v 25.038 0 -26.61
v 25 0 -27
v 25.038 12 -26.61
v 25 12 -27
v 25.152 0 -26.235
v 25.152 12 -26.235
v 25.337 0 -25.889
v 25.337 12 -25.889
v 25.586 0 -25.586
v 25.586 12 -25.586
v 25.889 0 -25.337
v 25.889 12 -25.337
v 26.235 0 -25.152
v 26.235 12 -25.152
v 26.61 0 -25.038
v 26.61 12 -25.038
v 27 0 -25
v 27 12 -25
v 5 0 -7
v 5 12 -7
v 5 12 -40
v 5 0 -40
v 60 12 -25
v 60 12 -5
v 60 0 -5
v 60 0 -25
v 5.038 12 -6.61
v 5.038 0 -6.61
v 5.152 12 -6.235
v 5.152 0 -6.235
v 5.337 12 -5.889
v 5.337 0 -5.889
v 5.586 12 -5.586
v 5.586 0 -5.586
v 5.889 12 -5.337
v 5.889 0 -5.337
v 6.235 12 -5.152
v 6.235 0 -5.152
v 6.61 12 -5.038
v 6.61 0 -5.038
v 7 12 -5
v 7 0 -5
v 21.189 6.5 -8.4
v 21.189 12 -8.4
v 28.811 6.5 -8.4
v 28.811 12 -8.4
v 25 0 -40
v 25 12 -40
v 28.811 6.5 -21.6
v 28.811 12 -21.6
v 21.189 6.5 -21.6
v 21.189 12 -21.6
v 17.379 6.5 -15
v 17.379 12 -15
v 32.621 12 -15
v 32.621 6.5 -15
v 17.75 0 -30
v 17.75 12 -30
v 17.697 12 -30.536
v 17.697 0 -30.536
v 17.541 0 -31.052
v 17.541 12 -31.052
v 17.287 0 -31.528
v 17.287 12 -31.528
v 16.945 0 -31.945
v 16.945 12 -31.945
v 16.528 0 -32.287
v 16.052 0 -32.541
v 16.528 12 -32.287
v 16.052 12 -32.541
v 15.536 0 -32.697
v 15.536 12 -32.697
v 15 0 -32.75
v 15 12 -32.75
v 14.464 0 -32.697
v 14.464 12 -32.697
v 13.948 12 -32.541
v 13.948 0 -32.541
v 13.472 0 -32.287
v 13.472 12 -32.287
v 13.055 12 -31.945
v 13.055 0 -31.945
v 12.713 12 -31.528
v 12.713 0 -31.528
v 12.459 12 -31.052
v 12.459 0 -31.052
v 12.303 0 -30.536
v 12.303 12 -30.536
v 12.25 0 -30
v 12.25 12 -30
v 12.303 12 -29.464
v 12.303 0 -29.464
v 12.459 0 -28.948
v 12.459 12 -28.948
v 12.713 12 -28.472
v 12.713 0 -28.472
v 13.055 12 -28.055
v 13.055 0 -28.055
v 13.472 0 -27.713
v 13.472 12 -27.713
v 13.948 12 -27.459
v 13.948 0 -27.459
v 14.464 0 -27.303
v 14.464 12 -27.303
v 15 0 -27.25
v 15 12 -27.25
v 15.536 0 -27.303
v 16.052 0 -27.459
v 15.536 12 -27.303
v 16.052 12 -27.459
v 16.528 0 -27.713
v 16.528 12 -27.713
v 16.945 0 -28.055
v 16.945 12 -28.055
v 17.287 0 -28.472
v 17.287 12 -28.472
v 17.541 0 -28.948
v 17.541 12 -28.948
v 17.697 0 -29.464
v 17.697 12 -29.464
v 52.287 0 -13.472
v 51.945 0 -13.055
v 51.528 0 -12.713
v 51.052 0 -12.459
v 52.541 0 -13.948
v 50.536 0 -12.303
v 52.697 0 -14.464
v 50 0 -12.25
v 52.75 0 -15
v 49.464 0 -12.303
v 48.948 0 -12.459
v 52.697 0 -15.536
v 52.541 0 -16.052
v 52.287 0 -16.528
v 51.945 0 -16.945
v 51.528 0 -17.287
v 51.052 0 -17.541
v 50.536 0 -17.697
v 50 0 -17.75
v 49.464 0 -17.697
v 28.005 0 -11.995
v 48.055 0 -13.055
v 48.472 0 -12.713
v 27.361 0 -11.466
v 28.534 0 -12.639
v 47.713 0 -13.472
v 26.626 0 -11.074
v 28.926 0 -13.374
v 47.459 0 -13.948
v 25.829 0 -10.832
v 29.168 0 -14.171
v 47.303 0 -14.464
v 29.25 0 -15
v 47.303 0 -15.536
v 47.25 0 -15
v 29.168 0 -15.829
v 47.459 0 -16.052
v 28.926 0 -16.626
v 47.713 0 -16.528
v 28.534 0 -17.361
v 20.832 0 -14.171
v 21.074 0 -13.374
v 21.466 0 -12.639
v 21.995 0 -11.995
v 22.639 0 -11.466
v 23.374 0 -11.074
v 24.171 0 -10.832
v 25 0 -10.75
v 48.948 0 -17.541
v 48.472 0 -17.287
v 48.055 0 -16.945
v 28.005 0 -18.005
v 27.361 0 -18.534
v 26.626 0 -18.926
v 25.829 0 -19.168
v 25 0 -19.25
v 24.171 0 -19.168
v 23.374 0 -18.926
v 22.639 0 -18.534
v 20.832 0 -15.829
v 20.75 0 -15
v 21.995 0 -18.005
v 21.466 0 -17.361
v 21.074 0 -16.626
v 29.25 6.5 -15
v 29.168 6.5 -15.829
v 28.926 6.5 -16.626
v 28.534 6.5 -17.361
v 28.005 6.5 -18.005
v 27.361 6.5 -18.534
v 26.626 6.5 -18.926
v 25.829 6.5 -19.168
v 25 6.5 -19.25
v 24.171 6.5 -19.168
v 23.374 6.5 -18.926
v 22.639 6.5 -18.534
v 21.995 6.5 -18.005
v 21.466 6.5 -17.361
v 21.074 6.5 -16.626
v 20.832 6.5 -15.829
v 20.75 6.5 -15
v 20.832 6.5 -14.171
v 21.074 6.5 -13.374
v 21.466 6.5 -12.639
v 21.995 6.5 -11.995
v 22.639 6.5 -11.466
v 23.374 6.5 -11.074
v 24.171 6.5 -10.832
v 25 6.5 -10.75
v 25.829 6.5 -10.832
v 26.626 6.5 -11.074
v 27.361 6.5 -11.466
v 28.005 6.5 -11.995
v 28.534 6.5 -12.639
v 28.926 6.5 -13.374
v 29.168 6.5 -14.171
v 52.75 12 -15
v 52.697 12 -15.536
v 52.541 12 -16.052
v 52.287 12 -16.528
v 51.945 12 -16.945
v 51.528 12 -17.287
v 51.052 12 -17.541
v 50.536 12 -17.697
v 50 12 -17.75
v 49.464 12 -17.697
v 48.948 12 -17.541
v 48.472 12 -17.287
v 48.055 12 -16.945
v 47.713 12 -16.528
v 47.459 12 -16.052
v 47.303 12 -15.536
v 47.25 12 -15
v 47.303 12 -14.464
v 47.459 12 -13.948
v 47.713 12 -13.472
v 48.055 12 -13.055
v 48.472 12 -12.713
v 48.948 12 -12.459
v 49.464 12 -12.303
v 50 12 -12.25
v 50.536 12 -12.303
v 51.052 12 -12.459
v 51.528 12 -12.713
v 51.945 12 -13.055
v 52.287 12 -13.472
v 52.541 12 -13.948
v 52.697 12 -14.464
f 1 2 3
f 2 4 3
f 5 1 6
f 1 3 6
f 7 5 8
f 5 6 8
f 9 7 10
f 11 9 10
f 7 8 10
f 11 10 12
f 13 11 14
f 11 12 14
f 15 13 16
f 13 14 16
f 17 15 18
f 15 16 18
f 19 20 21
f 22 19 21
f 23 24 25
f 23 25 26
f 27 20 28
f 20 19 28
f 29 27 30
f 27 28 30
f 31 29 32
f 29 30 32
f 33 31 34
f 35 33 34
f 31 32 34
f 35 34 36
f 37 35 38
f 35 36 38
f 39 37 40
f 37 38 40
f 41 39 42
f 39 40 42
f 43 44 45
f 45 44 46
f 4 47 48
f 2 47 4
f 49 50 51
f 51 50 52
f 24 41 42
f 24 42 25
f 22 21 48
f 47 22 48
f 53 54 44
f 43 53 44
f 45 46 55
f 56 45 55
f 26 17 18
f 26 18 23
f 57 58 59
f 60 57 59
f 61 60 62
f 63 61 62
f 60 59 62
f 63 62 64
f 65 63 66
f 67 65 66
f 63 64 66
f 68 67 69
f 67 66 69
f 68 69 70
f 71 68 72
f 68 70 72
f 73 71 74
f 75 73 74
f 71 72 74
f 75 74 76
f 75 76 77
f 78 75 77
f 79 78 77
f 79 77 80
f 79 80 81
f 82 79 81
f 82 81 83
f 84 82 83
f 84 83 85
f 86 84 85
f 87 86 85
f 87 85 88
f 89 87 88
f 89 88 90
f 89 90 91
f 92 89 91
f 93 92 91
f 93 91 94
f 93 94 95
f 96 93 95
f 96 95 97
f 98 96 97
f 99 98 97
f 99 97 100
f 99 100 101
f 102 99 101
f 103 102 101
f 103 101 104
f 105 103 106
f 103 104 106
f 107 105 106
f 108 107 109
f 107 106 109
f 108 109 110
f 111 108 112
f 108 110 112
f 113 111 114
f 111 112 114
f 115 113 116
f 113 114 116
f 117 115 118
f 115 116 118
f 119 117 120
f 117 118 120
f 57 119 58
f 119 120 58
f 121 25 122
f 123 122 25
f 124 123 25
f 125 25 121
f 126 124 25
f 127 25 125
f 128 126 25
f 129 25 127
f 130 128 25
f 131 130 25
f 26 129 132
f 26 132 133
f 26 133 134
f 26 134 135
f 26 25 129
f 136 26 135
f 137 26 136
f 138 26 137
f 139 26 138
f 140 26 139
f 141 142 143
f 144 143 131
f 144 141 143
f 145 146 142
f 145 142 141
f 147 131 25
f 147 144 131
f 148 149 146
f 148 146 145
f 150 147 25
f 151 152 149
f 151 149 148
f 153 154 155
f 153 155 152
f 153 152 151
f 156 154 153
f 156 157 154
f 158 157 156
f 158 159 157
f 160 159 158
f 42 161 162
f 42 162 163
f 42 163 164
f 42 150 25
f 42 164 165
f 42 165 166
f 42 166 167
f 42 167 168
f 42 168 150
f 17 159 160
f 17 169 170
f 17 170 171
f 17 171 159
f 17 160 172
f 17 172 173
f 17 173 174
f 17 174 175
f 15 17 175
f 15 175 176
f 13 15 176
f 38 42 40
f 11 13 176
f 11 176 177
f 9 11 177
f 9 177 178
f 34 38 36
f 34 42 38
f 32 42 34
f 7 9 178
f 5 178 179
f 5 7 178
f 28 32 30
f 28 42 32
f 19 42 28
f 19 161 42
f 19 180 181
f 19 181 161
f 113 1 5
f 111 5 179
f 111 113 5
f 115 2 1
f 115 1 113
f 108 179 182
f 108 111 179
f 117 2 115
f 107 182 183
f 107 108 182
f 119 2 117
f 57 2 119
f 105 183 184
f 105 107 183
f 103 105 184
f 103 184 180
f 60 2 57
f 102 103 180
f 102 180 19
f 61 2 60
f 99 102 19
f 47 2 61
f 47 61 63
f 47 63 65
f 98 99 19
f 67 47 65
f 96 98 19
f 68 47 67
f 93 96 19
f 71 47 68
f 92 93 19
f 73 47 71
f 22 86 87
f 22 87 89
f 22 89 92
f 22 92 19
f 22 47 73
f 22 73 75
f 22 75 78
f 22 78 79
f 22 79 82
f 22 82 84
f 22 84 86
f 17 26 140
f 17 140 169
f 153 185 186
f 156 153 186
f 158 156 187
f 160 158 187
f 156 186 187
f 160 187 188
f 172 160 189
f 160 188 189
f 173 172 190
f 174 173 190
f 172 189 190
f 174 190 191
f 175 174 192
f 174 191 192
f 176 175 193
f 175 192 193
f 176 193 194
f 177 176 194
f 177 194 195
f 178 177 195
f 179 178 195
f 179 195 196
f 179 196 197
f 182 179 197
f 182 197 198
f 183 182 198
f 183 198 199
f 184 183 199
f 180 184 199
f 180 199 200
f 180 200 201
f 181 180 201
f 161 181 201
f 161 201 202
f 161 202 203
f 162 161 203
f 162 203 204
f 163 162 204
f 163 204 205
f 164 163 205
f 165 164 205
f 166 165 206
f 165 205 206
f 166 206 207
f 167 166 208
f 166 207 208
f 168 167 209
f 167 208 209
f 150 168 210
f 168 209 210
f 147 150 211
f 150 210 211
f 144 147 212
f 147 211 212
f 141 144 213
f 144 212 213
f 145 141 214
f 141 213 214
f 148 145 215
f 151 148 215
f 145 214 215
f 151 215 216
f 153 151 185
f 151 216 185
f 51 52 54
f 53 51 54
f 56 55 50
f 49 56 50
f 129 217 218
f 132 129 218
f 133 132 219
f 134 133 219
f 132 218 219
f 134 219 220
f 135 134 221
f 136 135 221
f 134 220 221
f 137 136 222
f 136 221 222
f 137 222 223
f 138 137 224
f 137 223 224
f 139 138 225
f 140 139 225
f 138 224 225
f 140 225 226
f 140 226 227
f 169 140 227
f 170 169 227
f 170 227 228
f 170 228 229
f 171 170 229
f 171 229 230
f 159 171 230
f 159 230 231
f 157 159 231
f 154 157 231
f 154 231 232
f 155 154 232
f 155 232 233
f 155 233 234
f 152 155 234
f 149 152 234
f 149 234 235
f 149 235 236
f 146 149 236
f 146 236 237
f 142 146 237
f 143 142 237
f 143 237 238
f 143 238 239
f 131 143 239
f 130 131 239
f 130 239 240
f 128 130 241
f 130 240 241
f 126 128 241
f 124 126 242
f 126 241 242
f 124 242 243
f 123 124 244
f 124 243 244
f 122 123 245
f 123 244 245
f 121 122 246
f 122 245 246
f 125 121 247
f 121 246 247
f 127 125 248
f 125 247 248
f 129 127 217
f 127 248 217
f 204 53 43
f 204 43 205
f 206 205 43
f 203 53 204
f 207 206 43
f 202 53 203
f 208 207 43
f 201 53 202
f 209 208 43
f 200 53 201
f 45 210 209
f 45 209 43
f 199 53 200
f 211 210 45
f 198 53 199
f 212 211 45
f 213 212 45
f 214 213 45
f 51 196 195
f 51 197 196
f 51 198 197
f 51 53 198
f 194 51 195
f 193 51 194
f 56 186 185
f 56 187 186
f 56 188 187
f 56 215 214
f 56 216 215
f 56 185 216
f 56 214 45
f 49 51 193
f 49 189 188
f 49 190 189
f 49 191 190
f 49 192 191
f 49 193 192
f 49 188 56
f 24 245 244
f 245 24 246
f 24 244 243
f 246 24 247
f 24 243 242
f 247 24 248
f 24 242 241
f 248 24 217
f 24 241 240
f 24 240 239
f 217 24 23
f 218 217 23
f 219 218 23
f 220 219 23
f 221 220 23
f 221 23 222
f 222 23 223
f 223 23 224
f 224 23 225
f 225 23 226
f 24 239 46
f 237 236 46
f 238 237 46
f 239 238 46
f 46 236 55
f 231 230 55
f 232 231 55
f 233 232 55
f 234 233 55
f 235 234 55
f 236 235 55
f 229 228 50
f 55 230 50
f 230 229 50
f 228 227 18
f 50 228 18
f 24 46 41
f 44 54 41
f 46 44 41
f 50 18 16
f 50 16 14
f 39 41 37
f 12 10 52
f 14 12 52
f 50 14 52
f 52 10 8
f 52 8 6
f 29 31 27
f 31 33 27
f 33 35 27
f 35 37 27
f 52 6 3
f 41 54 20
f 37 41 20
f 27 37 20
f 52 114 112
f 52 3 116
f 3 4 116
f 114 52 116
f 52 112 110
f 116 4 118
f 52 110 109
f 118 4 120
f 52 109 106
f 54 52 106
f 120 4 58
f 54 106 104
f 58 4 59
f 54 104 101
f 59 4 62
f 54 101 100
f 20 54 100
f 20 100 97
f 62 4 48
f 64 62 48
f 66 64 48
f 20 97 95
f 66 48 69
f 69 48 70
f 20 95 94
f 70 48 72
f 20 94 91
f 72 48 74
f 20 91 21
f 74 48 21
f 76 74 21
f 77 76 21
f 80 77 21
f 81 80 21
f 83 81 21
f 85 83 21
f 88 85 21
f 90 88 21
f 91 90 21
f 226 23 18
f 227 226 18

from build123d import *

# Parameters (mm, degrees)
SALIENTE_EXTRUIR1_DEPTH = 12
SALIENTE_EXTRUIR2_DEPTH = 38
CROQUIS8_W              = 40
CROQUIS8_H              = 20
CORTAR_EXTRUIR5_DEPTH   = 20
CROQUIS3_R              = 4.25
CORTAR_EXTRUIR1_DEPTH   = 13
CORTAR_EXTRUIR2_DEPTH   = 5.5
REDONDEO1_R             = 2
CROQUIS5_W              = 4.8
CROQUIS5_H              = 35
CROQUIS5_W_2            = 15
CROQUIS5_H_2            = 4.8
SALIENTE_EXTRUIR3_DEPTH = 1
NGULO_DE_SALIDA1_ANGLE  = 15
NGULO_DE_SALIDA2_ANGLE  = 15
REDONDEO2_R             = 2
NGULO_DE_SALIDA3_ANGLE  = 15
REDONDEO3_R             = 1
CORTAR_EXTRUIR4_DEPTH   = 66
CORTAR_EXTRUIR6_DEPTH   = 66
CROQUIS12_W             = 65
CROQUIS12_H             = 38
CORTAR_EXTRUIR9_DEPTH   = 66
CROQUIS13_OUTSIDE_W     = 85.54
CROQUIS13_OUTSIDE_H     = 85.54
CROQUIS13_OUTSIDE_W_2   = 55
CROQUIS13_OUTSIDE_H_2   = 35
CORTAR_EXTRUIR10_DEPTH  = 13
REDONDEO5_R             = 2
CROQUIS14_R             = 2.75
CORTAR_EXTRUIR11_DEPTH  = 13


with BuildPart() as part:
    # Croquis1 → Saliente-Extruir1 (new body)
    with BuildSketch(Plane(origin=(0, 0, 0), x_dir=(1, 0, 0), z_dir=(0, 1, 0))):
        Polygon((25, 65), (25, 25), (65, 25), (65, 0), (0, 0), (0, 65), align=None)
    extrude(amount=SALIENTE_EXTRUIR1_DEPTH)

    # Croquis2 → Saliente-Extruir2 (add)
    with BuildSketch(Plane(origin=(0, 12, 0), x_dir=(1, 0, 0), z_dir=(0, 1, 0))):
        Polygon((0, 65), (0, 0), (65, 0), (65, 5), (37.4, 5), (37.4, 6), (32.6, 6), (32.6, 5), (17.4, 5), (17.4, 6), (12.6, 6), (12.6, 5), (5, 5), (5, 12.6), (6, 12.6), (6, 17.4), (5, 17.4), (5, 65), align=None)
    extrude(amount=SALIENTE_EXTRUIR2_DEPTH)

    # Croquis8 → Cortar-Extruir5 (cut)
    with BuildSketch(Plane(origin=(0, 50, 0), x_dir=(1, 0, 0), z_dir=(0, 1, 0))):
        with Locations((25, 15)):
            Rectangle(CROQUIS8_W, CROQUIS8_H)
    extrude(amount=-CORTAR_EXTRUIR5_DEPTH, mode=Mode.SUBTRACT)

    # Croquis3 → Cortar-Extruir1 (cut, through all)
    with BuildSketch(Plane(origin=(0, 12, 0), x_dir=(1, 0, 0), z_dir=(0, 1, 0))):
        with Locations((25, 15)):
            Circle(CROQUIS3_R)
    extrude(amount=-CORTAR_EXTRUIR1_DEPTH, mode=Mode.SUBTRACT)

    # Croquis4 → Cortar-Extruir2 (cut)
    with BuildSketch(Plane(origin=(0, 12, 0), x_dir=(1, 0, 0), z_dir=(0, 1, 0))):
        Polygon((32.621023553, 15), (28.810511777, 21.6), (21.189488223, 21.6), (17.378976447, 15), (21.189488223, 8.4), (28.810511777, 8.4), align=None)
    extrude(amount=-CORTAR_EXTRUIR2_DEPTH, mode=Mode.SUBTRACT)

    # Redondeo1
    redondeo1_edges = [part.edges().sort_by_distance(p)[0] for p in [
        (25, 6, -25),
    ]]
    fillet(redondeo1_edges, radius=REDONDEO1_R)

    # Croquis5 → Saliente-Extruir3 (add)
    with BuildSketch(Plane(origin=(0, 12, 0), x_dir=(1, 0, 0), z_dir=(0, 1, 0))):
        with Locations((15, 47.5)):
            Rectangle(CROQUIS5_W, CROQUIS5_H)
        with Locations((57.5, 15)):
            Rectangle(CROQUIS5_W_2, CROQUIS5_H_2)
    extrude(amount=SALIENTE_EXTRUIR3_DEPTH)

    # Ángulo de salida1
    ngulo_de_salida1_faces = [part.faces().sort_by_distance(p)[0] for p in [
        (57.5, 12.5, -17.4),
        (50, 12.5, -15),
        (57.5, 12.5, -12.6),
        (12.6, 12.5, -47.5),
        (15, 12.5, -30),
        (17.4, 12.5, -47.5),
    ]]
    draft(ngulo_de_salida1_faces, Plane.ZX.offset(12), NGULO_DE_SALIDA1_ANGLE)

    # Ángulo de salida2
    ngulo_de_salida2_faces = [part.faces().sort_by_distance(p)[0] for p in [
        (15, 30, -5.5),
        (35, 30, -5.5),
        (37.4, 21, -5.5),
        (32.6, 21, -5.5),
        (17.4, 21, -5.5),
        (12.6, 21, -5.5),
    ]]
    draft(ngulo_de_salida2_faces, Plane(origin=(65, 50, -5), x_dir=(-1, 0, 0), z_dir=(0, 0, -1)), NGULO_DE_SALIDA2_ANGLE)

    # Redondeo2
    redondeo2_edges = [part.edges().sort_by_distance(p)[0] for p in [
        (0, 25, 0),
    ]]
    fillet(redondeo2_edges, radius=REDONDEO2_R)

    # Ángulo de salida3
    ngulo_de_salida3_faces = [part.faces().sort_by_distance(p)[0] for p in [
        (5.5, 30, -15),
        (5.5, 21, -17.4),
        (5.5, 21, -12.6),
    ]]
    draft(ngulo_de_salida3_faces, Plane(origin=(5, 50, -5), x_dir=(0, 0, 1), z_dir=(1, 0, 0)), NGULO_DE_SALIDA3_ANGLE)

    # Redondeo3
    redondeo3_edges = [part.edges().sort_by_distance(p)[0] for p in [
        (5, 31, -5),
    ]]
    fillet(redondeo3_edges, radius=REDONDEO3_R)

    # Croquis6 → Cortar-Extruir4 (cut, through all)
    with BuildSketch(Plane.ZY):
        with BuildLine():
            Line((-16, 45.5), (-14, 45.5))
            Line((-14, 45.5), (-12.696855696, 43.502673056))
            ThreePointArc((-12.696855696, 43.502673056), (-15, 39.25), (-17.303144304, 43.502673056))
            Line((-17.303144304, 43.502673056), (-16, 45.5))
        make_face()
        with BuildLine():
            Line((-56, 45.5), (-54, 45.5))
            Line((-54, 45.5), (-52.696855696, 43.502673056))
            ThreePointArc((-52.696855696, 43.502673056), (-55, 39.25), (-57.303144304, 43.502673056))
            Line((-57.303144304, 43.502673056), (-56, 45.5))
        make_face()
        with BuildLine():
            Line((-56, 25.5), (-54, 25.5))
            Line((-54, 25.5), (-52.696855696, 23.502673056))
            ThreePointArc((-52.696855696, 23.502673056), (-55, 19.25), (-57.303144304, 23.502673056))
            Line((-57.303144304, 23.502673056), (-56, 25.5))
        make_face()
    extrude(amount=-CORTAR_EXTRUIR4_DEPTH, mode=Mode.SUBTRACT)

    # Croquis9 → Cortar-Extruir6 (cut, through all)
    with BuildSketch(Plane.XY):
        with BuildLine():
            Line((14, 45.5), (16, 45.5))
            Line((16, 45.5), (17.303144304, 43.502673056))
            ThreePointArc((17.303144304, 43.502673056), (15, 39.25), (12.696855696, 43.502673056))
            Line((12.696855696, 43.502673056), (14, 45.5))
        make_face()
        with BuildLine():
            Line((54, 45.5), (56, 45.5))
            Line((56, 45.5), (57.303144304, 43.502673056))
            ThreePointArc((57.303144304, 43.502673056), (55, 39.25), (52.696855696, 43.502673056))
            Line((52.696855696, 43.502673056), (54, 45.5))
        make_face()
        with BuildLine():
            Line((54, 25.5), (56, 25.5))
            Line((56, 25.5), (57.303144304, 23.502673056))
            ThreePointArc((57.303144304, 23.502673056), (55, 19.25), (52.696855696, 23.502673056))
            Line((52.696855696, 23.502673056), (54, 25.5))
        make_face()
    extrude(amount=-CORTAR_EXTRUIR6_DEPTH, mode=Mode.SUBTRACT)

    # Croquis12 → Cortar-Extruir9 (cut, through all)
    with BuildSketch(Plane(origin=(65, 0, 0), x_dir=(0, 0, -1), z_dir=(1, 0, 0))):
        with Locations((32.5, 31)):
            Rectangle(CROQUIS12_W, CROQUIS12_H)
    extrude(amount=-CORTAR_EXTRUIR9_DEPTH, mode=Mode.SUBTRACT)

    # Croquis13 outside → Cortar-Extruir10 (cut, through all)
    with BuildSketch(Plane(origin=(0, 12, 0), x_dir=(1, 0, 0), z_dir=(0, 1, 0))):
        with Locations((32.5, 32.5)):
            Rectangle(CROQUIS13_OUTSIDE_W, CROQUIS13_OUTSIDE_H)
        with Locations((32.5, 22.5)):
            Rectangle(CROQUIS13_OUTSIDE_W_2, CROQUIS13_OUTSIDE_H_2, mode=Mode.SUBTRACT)
    extrude(amount=-CORTAR_EXTRUIR10_DEPTH, mode=Mode.SUBTRACT)

    # Redondeo5
    redondeo5_edges = [part.edges().sort_by_distance(p)[0] for p in [
        (5, 6, -5),
    ]]
    fillet(redondeo5_edges, radius=REDONDEO5_R)

    # Croquis14 → Cortar-Extruir11 (cut, through all)
    with BuildSketch(Plane(origin=(0, 12, 0), x_dir=(1, 0, 0), z_dir=(0, 1, 0))):
        with Locations((15, 30)):
            Circle(CROQUIS14_R)
        with Locations((50, 15)):
            Circle(CROQUIS14_R)
    extrude(amount=-CORTAR_EXTRUIR11_DEPTH, mode=Mode.SUBTRACT)


solid = part.part
